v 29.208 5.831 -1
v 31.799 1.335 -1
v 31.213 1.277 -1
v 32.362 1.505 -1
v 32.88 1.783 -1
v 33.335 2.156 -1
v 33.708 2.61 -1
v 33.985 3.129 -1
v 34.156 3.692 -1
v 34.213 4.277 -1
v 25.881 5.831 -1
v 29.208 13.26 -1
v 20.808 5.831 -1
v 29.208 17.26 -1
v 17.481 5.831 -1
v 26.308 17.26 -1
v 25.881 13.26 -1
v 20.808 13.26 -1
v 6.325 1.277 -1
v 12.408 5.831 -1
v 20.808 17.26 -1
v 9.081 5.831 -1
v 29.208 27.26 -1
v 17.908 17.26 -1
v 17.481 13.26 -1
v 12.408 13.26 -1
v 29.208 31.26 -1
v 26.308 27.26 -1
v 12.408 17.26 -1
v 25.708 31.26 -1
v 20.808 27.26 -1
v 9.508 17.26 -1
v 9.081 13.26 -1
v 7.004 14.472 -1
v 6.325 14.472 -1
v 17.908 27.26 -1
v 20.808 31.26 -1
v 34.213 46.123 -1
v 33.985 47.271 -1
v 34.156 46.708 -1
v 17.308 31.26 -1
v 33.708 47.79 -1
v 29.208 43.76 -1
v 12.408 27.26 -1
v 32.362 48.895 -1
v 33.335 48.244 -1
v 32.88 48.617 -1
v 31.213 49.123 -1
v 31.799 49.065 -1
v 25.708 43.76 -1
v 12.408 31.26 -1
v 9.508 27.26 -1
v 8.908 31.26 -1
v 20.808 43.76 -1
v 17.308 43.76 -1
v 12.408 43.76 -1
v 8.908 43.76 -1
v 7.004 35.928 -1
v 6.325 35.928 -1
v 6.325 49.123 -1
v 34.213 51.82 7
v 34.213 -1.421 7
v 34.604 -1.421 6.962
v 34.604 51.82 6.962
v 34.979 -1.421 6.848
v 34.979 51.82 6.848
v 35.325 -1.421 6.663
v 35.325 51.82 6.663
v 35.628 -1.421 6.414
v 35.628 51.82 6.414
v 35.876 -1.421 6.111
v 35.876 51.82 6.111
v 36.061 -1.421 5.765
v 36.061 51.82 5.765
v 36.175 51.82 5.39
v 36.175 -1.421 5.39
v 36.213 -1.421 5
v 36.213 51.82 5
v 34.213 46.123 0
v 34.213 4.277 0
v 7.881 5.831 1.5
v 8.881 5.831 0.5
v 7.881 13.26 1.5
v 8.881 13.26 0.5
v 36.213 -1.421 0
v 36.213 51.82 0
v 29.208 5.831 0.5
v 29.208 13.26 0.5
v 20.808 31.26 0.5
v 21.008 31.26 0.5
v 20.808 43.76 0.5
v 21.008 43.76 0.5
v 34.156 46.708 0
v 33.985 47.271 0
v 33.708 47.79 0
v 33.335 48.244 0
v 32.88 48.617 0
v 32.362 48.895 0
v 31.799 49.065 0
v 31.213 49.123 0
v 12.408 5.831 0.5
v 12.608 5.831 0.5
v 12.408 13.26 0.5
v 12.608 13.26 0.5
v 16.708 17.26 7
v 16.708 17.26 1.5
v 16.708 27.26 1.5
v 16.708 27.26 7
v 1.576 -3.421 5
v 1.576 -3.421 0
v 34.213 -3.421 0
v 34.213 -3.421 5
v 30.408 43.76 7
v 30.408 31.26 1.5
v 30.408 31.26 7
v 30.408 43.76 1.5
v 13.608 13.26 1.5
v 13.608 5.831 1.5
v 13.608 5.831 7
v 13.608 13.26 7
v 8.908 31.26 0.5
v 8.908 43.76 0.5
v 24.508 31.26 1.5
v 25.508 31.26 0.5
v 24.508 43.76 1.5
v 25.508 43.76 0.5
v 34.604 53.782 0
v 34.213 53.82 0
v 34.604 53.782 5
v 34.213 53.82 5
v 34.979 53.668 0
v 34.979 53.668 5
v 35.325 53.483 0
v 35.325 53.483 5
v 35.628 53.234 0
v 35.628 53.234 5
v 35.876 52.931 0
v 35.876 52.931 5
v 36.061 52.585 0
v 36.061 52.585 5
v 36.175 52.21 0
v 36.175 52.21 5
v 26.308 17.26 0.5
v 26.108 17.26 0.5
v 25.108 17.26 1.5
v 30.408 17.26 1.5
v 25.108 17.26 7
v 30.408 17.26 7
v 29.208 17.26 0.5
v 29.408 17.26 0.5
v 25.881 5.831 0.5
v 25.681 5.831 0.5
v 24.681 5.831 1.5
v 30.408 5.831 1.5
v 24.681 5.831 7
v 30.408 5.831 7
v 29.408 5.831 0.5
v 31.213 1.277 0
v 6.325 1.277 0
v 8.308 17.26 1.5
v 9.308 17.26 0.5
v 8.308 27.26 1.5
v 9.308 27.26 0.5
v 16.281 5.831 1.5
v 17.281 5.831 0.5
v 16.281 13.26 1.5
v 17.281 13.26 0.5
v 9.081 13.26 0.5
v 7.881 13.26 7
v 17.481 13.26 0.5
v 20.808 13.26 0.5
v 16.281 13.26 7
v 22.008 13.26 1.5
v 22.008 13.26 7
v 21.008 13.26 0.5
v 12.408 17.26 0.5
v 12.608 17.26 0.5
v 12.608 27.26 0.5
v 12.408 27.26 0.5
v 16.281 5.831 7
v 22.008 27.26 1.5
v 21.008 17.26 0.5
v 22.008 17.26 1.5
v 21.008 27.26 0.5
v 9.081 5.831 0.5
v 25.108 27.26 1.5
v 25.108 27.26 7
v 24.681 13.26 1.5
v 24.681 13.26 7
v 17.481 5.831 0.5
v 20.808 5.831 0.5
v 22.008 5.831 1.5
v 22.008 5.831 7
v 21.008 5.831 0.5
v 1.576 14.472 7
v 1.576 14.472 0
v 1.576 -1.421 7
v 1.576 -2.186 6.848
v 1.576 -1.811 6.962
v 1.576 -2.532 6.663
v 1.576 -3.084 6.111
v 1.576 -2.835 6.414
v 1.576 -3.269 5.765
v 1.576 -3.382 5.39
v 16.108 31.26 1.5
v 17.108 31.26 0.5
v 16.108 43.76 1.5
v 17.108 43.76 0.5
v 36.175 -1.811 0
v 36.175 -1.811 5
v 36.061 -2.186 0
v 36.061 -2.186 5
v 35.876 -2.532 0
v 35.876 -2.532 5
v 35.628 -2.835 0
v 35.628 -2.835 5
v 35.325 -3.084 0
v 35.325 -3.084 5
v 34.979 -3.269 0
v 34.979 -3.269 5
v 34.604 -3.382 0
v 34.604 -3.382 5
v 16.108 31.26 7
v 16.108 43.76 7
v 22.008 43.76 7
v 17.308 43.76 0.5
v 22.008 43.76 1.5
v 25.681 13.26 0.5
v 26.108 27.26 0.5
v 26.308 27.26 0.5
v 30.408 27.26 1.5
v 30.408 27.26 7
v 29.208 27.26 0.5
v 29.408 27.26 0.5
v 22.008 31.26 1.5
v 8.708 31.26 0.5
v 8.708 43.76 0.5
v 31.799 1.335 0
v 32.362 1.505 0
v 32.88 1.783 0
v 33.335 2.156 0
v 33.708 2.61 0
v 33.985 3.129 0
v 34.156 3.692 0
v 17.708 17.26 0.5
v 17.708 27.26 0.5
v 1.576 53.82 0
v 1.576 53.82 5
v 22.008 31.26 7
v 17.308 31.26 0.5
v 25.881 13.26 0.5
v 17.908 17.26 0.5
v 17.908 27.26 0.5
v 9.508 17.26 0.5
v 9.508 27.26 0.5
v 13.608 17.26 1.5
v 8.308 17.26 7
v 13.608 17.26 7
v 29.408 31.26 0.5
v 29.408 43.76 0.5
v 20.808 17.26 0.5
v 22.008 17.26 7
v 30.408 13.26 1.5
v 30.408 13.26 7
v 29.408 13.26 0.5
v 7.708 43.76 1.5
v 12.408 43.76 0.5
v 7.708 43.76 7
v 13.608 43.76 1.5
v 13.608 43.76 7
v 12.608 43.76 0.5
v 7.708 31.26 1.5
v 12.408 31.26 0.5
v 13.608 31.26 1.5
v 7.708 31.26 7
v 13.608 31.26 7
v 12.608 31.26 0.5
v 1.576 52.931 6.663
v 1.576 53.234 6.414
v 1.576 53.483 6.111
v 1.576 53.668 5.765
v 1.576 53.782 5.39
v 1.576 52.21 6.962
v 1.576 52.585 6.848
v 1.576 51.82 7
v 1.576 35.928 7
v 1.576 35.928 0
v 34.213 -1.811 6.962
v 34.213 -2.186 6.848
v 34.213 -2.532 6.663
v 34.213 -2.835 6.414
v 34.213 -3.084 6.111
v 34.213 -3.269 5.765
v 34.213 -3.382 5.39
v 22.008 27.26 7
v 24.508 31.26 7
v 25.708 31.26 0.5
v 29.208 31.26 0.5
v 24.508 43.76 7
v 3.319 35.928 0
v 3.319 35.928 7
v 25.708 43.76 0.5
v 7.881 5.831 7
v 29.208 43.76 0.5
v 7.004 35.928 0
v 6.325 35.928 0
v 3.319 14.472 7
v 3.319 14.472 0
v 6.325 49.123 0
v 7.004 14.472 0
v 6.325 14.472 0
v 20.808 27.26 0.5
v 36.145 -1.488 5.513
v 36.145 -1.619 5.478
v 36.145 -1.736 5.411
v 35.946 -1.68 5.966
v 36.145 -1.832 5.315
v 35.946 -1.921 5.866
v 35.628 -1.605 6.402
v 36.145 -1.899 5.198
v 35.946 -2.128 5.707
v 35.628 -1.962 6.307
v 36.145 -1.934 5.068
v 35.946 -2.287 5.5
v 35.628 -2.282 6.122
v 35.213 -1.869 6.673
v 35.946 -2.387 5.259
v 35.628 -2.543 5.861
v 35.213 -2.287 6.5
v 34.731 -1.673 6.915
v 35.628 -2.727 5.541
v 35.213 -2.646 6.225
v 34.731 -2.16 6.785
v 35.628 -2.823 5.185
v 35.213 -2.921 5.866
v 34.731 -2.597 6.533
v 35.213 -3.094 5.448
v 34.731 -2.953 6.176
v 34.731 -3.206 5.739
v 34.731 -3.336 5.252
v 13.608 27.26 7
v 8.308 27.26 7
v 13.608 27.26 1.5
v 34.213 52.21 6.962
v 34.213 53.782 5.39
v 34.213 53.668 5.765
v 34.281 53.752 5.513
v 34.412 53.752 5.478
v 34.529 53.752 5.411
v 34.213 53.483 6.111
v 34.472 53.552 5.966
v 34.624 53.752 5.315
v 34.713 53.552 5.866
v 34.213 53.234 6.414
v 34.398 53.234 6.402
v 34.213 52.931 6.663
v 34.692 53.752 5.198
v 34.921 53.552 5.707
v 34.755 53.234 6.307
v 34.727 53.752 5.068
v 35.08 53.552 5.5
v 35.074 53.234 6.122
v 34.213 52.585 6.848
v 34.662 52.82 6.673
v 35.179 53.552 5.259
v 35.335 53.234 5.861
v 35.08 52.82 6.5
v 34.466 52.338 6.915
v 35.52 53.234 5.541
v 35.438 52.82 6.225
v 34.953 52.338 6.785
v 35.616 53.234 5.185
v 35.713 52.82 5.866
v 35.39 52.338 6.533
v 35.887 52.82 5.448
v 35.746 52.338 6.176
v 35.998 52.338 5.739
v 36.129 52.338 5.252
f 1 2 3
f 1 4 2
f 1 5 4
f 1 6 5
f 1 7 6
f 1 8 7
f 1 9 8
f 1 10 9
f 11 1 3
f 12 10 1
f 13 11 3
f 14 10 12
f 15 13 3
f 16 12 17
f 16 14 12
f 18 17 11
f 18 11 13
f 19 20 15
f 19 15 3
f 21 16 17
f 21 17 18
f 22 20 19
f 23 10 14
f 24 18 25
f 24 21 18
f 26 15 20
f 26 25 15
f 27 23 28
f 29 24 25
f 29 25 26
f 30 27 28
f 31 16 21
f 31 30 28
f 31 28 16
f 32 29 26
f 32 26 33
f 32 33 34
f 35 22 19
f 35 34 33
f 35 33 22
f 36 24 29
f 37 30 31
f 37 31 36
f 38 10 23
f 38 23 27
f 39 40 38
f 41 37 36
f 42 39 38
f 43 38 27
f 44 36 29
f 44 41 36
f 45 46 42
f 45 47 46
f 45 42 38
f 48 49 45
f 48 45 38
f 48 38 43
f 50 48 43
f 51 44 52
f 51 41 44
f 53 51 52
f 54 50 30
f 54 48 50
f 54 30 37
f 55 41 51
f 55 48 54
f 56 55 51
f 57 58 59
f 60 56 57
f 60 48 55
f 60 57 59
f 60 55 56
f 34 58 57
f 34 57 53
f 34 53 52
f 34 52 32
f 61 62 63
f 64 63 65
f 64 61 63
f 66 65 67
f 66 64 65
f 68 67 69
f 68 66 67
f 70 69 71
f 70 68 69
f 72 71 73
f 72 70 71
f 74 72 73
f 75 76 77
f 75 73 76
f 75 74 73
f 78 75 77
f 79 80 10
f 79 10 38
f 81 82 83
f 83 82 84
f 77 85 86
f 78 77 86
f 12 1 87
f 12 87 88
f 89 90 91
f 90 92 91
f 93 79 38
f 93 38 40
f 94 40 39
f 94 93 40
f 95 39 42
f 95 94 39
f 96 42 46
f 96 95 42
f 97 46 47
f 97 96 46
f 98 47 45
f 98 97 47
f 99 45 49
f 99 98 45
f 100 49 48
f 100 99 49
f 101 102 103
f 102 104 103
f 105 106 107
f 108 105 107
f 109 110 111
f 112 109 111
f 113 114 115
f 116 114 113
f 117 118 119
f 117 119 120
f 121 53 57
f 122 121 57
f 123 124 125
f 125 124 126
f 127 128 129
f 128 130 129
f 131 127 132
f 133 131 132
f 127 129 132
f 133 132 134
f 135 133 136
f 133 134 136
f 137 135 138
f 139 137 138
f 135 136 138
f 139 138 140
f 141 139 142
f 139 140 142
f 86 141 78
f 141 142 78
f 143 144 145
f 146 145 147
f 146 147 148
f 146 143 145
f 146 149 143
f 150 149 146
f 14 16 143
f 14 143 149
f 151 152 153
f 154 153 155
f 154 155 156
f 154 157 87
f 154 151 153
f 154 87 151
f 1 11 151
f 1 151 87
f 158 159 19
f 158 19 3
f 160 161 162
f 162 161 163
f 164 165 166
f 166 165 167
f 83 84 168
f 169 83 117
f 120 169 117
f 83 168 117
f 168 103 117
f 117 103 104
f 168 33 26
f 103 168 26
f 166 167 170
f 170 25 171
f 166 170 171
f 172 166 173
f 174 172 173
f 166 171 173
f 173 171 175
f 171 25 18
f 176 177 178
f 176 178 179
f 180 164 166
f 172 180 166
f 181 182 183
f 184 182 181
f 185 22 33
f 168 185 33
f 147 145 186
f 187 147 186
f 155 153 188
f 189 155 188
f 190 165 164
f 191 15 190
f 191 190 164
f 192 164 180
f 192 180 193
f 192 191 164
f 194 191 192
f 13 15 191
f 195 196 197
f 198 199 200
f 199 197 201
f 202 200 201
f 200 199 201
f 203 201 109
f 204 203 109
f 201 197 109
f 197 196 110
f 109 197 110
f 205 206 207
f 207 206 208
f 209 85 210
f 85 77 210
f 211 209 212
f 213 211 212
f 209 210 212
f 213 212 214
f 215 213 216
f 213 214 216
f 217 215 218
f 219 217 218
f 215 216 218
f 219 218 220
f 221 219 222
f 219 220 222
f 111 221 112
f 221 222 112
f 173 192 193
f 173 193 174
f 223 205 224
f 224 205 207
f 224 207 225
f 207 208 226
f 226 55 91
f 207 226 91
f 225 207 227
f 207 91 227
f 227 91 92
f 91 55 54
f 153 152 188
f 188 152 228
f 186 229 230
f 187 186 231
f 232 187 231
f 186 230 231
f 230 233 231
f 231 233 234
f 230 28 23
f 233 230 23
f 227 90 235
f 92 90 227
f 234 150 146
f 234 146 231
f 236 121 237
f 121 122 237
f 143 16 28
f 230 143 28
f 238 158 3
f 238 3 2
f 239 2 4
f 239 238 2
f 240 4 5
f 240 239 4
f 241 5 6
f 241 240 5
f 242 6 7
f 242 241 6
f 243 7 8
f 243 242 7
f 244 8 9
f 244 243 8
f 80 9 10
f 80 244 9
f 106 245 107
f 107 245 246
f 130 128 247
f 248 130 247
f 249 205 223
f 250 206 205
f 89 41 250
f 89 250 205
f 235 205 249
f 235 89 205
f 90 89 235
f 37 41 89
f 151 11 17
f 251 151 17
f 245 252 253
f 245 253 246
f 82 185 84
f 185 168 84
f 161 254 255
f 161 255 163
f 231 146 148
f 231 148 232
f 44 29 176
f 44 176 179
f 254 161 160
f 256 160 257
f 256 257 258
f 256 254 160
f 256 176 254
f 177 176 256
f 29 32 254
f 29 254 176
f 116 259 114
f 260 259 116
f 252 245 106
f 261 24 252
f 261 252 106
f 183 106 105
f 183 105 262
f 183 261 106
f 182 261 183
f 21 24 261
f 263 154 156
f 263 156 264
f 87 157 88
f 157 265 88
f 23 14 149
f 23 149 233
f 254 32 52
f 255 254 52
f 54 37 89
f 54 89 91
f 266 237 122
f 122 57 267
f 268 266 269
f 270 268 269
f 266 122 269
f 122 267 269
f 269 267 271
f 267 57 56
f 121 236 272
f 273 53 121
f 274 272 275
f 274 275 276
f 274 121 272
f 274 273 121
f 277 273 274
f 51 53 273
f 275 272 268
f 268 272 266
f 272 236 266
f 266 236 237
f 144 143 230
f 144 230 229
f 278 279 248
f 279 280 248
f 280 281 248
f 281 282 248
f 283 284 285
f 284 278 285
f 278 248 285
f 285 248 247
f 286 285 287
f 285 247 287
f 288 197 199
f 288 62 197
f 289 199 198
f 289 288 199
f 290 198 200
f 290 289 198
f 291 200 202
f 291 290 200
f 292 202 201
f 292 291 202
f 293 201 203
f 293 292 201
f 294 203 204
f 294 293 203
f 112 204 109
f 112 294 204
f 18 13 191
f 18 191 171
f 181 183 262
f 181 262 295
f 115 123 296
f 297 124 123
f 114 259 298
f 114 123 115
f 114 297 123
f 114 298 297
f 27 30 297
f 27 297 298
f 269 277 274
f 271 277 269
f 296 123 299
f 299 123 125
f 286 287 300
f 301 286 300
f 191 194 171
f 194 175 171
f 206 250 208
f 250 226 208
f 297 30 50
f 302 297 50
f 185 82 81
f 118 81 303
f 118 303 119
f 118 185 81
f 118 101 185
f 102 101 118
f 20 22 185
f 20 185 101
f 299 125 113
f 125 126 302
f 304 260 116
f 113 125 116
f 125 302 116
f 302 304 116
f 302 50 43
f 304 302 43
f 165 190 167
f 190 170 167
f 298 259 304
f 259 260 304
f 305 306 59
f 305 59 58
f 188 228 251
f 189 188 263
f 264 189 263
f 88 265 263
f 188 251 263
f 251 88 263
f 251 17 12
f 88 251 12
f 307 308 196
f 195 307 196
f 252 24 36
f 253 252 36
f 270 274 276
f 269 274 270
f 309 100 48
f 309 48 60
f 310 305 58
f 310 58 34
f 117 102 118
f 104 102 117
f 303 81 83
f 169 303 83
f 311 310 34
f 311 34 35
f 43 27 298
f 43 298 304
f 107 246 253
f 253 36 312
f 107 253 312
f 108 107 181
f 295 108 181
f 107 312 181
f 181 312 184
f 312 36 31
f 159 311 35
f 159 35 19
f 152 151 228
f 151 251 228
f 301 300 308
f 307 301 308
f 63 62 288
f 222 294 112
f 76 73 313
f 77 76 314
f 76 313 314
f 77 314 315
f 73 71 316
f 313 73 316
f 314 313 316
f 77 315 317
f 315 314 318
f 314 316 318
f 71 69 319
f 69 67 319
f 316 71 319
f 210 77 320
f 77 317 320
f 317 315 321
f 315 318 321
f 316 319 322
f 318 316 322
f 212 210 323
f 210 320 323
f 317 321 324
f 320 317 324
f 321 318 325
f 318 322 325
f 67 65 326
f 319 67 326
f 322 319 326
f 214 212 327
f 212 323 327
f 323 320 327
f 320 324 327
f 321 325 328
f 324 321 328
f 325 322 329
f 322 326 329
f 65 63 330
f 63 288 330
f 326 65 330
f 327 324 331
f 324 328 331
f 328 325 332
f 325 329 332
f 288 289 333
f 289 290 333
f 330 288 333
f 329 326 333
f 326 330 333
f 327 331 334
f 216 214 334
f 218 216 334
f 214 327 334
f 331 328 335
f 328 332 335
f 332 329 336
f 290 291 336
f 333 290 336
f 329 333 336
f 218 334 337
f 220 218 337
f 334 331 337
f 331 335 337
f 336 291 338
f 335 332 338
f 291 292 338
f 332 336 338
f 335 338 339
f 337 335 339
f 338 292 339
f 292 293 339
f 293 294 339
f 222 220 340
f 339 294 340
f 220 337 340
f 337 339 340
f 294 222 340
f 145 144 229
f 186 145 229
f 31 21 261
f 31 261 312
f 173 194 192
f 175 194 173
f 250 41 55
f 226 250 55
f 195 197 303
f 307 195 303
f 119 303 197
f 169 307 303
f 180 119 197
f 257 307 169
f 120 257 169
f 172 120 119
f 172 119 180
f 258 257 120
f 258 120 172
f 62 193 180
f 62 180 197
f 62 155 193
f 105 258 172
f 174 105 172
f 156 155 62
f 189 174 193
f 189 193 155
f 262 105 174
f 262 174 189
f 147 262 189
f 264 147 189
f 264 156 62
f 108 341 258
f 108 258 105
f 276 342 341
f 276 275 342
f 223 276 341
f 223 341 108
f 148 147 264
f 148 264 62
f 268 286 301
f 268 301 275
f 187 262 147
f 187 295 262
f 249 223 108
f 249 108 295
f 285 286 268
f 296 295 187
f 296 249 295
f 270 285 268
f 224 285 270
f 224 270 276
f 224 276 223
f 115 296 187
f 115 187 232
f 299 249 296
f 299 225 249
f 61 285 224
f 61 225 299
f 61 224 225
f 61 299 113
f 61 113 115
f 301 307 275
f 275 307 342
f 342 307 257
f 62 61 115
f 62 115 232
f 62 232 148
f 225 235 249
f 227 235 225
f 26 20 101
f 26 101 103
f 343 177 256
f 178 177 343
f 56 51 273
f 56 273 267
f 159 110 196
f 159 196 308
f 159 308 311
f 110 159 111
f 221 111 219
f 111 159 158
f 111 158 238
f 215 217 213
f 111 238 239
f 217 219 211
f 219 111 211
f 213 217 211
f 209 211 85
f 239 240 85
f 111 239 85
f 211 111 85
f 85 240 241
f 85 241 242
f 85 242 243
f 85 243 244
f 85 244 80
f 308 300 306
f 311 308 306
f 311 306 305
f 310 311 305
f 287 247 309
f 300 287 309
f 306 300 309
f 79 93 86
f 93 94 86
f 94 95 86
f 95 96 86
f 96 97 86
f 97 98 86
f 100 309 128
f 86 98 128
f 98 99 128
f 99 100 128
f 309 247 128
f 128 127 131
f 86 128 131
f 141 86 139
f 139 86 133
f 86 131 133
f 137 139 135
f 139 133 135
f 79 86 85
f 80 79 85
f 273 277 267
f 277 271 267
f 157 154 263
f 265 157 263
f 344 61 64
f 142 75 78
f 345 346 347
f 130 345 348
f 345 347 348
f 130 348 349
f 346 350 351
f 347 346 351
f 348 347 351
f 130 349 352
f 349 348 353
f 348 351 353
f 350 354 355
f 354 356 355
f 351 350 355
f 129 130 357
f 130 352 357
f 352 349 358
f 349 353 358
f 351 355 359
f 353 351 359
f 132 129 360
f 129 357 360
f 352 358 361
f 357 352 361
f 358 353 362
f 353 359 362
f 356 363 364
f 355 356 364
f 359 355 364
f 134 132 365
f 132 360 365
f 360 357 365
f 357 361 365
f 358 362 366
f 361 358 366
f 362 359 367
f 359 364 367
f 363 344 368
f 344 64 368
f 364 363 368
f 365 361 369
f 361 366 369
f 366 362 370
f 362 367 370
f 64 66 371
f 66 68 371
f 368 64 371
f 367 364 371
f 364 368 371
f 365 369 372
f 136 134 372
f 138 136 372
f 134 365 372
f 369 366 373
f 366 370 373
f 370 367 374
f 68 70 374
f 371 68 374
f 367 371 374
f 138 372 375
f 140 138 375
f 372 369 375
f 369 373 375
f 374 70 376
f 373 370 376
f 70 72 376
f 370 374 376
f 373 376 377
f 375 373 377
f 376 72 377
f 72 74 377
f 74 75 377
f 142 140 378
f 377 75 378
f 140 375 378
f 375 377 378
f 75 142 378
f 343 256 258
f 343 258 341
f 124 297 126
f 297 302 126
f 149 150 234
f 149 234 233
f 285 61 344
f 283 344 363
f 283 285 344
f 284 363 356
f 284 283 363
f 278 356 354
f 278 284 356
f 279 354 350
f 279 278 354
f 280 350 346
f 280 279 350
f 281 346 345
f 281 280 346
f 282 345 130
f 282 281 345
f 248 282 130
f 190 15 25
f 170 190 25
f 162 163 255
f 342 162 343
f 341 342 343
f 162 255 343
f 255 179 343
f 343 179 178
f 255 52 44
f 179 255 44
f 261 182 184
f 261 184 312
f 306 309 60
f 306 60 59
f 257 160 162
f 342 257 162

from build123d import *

# Parameters (mm, degrees)
CROQUIS1_W              = 5.9
CROQUIS1_H              = 12.5
CROQUIS1_W_2            = 5.3
CROQUIS1_H_2            = 10
CROQUIS1_W_3            = 5.7277
CROQUIS1_H_3            = 7.4295
SALIENTE_EXTRUIR1_DEPTH = 1
CROQUIS2_W              = 5.9
CROQUIS2_H              = 12.5
CROQUIS2_W_2            = 5.3
CROQUIS2_H_2            = 10
CROQUIS2_W_3            = 5.7277
CROQUIS2_H_3            = 7.4295
SALIENTE_EXTRUIR2_DEPTH = 7
CROQUIS3_W              = 1.2
CROQUIS3_H              = 7.4295
CROQUIS3_H_2            = 10
CROQUIS3_H_3            = 12.5
SALIENTE_EXTRUIR3_DEPTH = 1.5
CHAFL_N1_SIZE           = 1
REDONDEO1_R             = 2


with BuildPart() as part:
    # Croquis1 → Saliente-Extruir1 (new body)
    with BuildSketch(Plane.XY):
        with BuildLine():
            Line((6.325110646, 1.27705094), (31.213497595, 1.27705094))
            ThreePointArc((31.213497595, 1.27705094), (33.334817939, 2.155730596), (34.213497595, 4.27705094))
            Line((34.213497595, 4.27705094), (34.213497595, 46.12294906))
            ThreePointArc((34.213497595, 46.12294906), (33.334817939, 48.244269404), (31.213497595, 49.12294906))
            Line((31.213497595, 49.12294906), (6.325110646, 49.12294906))
            Line((6.325110646, 49.12294906), (6.325110646, 35.928313067))
            Line((6.325110646, 35.928313067), (7.004112389, 35.928313067))
            Line((7.004112389, 35.928313067), (7.004112389, 14.471686933))
            Line((7.004112389, 14.471686933), (6.325110646, 14.471686933))
            Line((6.325110646, 14.471686933), (6.325110646, 1.27705094))
        make_face()
        with Locations((27.45822767, 37.510466453)):
            Rectangle(CROQUIS1_W, CROQUIS1_H, mode=Mode.SUBTRACT)
        with Locations((27.75822767, 22.260466453)):
            Rectangle(CROQUIS1_W_2, CROQUIS1_H_2, mode=Mode.SUBTRACT)
        with Locations((27.54437767, 9.545716453)):
            Rectangle(CROQUIS1_W_3, CROQUIS1_H_3, mode=Mode.SUBTRACT)
        with Locations((19.05822767, 37.510466453)):
            Rectangle(CROQUIS1_W, CROQUIS1_H, mode=Mode.SUBTRACT)
        with Locations((19.35822767, 22.260466453)):
            Rectangle(CROQUIS1_W_2, CROQUIS1_H_2, mode=Mode.SUBTRACT)
        with Locations((19.14437767, 9.545716453)):
            Rectangle(CROQUIS1_W_3, CROQUIS1_H_3, mode=Mode.SUBTRACT)
        with Locations((10.65822767, 37.510466453)):
            Rectangle(CROQUIS1_W, CROQUIS1_H, mode=Mode.SUBTRACT)
        with Locations((10.95822767, 22.260466453)):
            Rectangle(CROQUIS1_W_2, CROQUIS1_H_2, mode=Mode.SUBTRACT)
        with Locations((10.74437767, 9.545716453)):
            Rectangle(CROQUIS1_W_3, CROQUIS1_H_3, mode=Mode.SUBTRACT)
    extrude(amount=-SALIENTE_EXTRUIR1_DEPTH)

    # Croquis2 → Saliente-Extruir2 (add)
    with BuildSketch(Plane.XY):
        Polygon((36.213497595, 53.820046244), (1.576275643, 53.820046244), (1.576275643, 35.928313067), (3.319198905, 35.928313067), (3.319198905, 14.471686933), (1.576275643, 14.471686933), (1.576275643, -3.420839566), (36.213497595, -3.420839566), align=None)
        with Locations((27.45822767, 37.510466453)):
            Rectangle(CROQUIS2_W, CROQUIS2_H, mode=Mode.SUBTRACT)
        with Locations((27.75822767, 22.260466453)):
            Rectangle(CROQUIS2_W_2, CROQUIS2_H_2, mode=Mode.SUBTRACT)
        with Locations((27.54437767, 9.545716453)):
            Rectangle(CROQUIS2_W_3, CROQUIS2_H_3, mode=Mode.SUBTRACT)
        with Locations((19.14437767, 9.545716453)):
            Rectangle(CROQUIS2_W_3, CROQUIS2_H_3, mode=Mode.SUBTRACT)
        with Locations((19.35822767, 22.260466453)):
            Rectangle(CROQUIS2_W_2, CROQUIS2_H_2, mode=Mode.SUBTRACT)
        with Locations((19.05822767, 37.510466453)):
            Rectangle(CROQUIS2_W, CROQUIS2_H, mode=Mode.SUBTRACT)
        with Locations((10.65822767, 37.510466453)):
            Rectangle(CROQUIS2_W, CROQUIS2_H, mode=Mode.SUBTRACT)
        with Locations((10.95822767, 22.260466453)):
            Rectangle(CROQUIS2_W_2, CROQUIS2_H_2, mode=Mode.SUBTRACT)
        with Locations((10.74437767, 9.545716453)):
            Rectangle(CROQUIS2_W_3, CROQUIS2_H_3, mode=Mode.SUBTRACT)
    extrude(amount=SALIENTE_EXTRUIR2_DEPTH)

    # Croquis3 → Saliente-Extruir3 (add)
    with BuildSketch(Plane(origin=(0, 0, -1), x_dir=(-1, 0, 0), z_dir=(0, 0, -1))):
        with Locations((-29.80822767, 9.545716453)):
            Rectangle(CROQUIS3_W, CROQUIS3_H)
        with Locations((-21.40822767, 9.545716453)):
            Rectangle(CROQUIS3_W, CROQUIS3_H)
        with Locations((-25.28052767, 9.545716453)):
            Rectangle(CROQUIS3_W, CROQUIS3_H)
        with Locations((-16.88052767, 9.545716453)):
            Rectangle(CROQUIS3_W, CROQUIS3_H)
        with Locations((-13.00822767, 9.545716453)):
            Rectangle(CROQUIS3_W, CROQUIS3_H)
        with Locations((-8.48052767, 9.545716453)):
            Rectangle(CROQUIS3_W, CROQUIS3_H)
        with Locations((-29.80822767, 22.260466453)):
            Rectangle(CROQUIS3_W, CROQUIS3_H_2)
        with Locations((-21.40822767, 22.260466453)):
            Rectangle(CROQUIS3_W, CROQUIS3_H_2)
        with Locations((-25.70822767, 22.260466453)):
            Rectangle(CROQUIS3_W, CROQUIS3_H_2)
        with Locations((-17.30822767, 22.260466453)):
            Rectangle(CROQUIS3_W, CROQUIS3_H_2)
        with Locations((-13.00822767, 22.260466453)):
            Rectangle(CROQUIS3_W, CROQUIS3_H_2)
        with Locations((-8.90822767, 22.260466453)):
            Rectangle(CROQUIS3_W, CROQUIS3_H_2)
        with Locations((-29.80822767, 37.510466453)):
            Rectangle(CROQUIS3_W, CROQUIS3_H_3)
        with Locations((-25.10822767, 37.510466453)):
            Rectangle(CROQUIS3_W, CROQUIS3_H_3)
        with Locations((-21.40822767, 37.510466453)):
            Rectangle(CROQUIS3_W, CROQUIS3_H_3)
        with Locations((-16.70822767, 37.510466453)):
            Rectangle(CROQUIS3_W, CROQUIS3_H_3)
        with Locations((-13.00822767, 37.510466453)):
            Rectangle(CROQUIS3_W, CROQUIS3_H_3)
        with Locations((-8.30822767, 37.510466453)):
            Rectangle(CROQUIS3_W, CROQUIS3_H_3)
    extrude(amount=-SALIENTE_EXTRUIR3_DEPTH)

    # Chaflán1
    chafl_n1_edges = [part.edges().sort_by_distance(p)[0] for p in [
        (30.40822767, 9.545716453, 0.5),
        (24.68052767, 9.545716453, 0.5),
        (22.00822767, 9.545716453, 0.5),
        (16.28052767, 9.545716453, 0.5),
        (13.60822767, 9.545716453, 0.5),
        (7.88052767, 9.545716453, 0.5),
        (30.40822767, 22.260466453, 0.5),
        (25.10822767, 22.260466453, 0.5),
        (22.00822767, 22.260466453, 0.5),
        (16.70822767, 22.260466453, 0.5),
        (13.60822767, 22.260466453, 0.5),
        (8.30822767, 22.260466453, 0.5),
        (30.40822767, 37.510466453, 0.5),
        (24.50822767, 37.510466453, 0.5),
        (22.00822767, 37.510466453, 0.5),
        (16.10822767, 37.510466453, 0.5),
        (13.60822767, 37.510466453, 0.5),
        (7.70822767, 37.510466453, 0.5),
    ]]
    chamfer(chafl_n1_edges, length=CHAFL_N1_SIZE)

    # Redondeo1
    redondeo1_edges = [part.edges().sort_by_distance(p)[0] for p in [
        (18.894886619, -3.420839566, 7),
        (36.213497595, 25.199603339, 7),
        (18.894886619, 53.820046244, 7),
        (36.213497595, -3.420839566, 3.5),
        (36.213497595, 53.820046244, 3.5),
    ]]
    fillet(redondeo1_edges, radius=REDONDEO1_R)


solid = part.part
